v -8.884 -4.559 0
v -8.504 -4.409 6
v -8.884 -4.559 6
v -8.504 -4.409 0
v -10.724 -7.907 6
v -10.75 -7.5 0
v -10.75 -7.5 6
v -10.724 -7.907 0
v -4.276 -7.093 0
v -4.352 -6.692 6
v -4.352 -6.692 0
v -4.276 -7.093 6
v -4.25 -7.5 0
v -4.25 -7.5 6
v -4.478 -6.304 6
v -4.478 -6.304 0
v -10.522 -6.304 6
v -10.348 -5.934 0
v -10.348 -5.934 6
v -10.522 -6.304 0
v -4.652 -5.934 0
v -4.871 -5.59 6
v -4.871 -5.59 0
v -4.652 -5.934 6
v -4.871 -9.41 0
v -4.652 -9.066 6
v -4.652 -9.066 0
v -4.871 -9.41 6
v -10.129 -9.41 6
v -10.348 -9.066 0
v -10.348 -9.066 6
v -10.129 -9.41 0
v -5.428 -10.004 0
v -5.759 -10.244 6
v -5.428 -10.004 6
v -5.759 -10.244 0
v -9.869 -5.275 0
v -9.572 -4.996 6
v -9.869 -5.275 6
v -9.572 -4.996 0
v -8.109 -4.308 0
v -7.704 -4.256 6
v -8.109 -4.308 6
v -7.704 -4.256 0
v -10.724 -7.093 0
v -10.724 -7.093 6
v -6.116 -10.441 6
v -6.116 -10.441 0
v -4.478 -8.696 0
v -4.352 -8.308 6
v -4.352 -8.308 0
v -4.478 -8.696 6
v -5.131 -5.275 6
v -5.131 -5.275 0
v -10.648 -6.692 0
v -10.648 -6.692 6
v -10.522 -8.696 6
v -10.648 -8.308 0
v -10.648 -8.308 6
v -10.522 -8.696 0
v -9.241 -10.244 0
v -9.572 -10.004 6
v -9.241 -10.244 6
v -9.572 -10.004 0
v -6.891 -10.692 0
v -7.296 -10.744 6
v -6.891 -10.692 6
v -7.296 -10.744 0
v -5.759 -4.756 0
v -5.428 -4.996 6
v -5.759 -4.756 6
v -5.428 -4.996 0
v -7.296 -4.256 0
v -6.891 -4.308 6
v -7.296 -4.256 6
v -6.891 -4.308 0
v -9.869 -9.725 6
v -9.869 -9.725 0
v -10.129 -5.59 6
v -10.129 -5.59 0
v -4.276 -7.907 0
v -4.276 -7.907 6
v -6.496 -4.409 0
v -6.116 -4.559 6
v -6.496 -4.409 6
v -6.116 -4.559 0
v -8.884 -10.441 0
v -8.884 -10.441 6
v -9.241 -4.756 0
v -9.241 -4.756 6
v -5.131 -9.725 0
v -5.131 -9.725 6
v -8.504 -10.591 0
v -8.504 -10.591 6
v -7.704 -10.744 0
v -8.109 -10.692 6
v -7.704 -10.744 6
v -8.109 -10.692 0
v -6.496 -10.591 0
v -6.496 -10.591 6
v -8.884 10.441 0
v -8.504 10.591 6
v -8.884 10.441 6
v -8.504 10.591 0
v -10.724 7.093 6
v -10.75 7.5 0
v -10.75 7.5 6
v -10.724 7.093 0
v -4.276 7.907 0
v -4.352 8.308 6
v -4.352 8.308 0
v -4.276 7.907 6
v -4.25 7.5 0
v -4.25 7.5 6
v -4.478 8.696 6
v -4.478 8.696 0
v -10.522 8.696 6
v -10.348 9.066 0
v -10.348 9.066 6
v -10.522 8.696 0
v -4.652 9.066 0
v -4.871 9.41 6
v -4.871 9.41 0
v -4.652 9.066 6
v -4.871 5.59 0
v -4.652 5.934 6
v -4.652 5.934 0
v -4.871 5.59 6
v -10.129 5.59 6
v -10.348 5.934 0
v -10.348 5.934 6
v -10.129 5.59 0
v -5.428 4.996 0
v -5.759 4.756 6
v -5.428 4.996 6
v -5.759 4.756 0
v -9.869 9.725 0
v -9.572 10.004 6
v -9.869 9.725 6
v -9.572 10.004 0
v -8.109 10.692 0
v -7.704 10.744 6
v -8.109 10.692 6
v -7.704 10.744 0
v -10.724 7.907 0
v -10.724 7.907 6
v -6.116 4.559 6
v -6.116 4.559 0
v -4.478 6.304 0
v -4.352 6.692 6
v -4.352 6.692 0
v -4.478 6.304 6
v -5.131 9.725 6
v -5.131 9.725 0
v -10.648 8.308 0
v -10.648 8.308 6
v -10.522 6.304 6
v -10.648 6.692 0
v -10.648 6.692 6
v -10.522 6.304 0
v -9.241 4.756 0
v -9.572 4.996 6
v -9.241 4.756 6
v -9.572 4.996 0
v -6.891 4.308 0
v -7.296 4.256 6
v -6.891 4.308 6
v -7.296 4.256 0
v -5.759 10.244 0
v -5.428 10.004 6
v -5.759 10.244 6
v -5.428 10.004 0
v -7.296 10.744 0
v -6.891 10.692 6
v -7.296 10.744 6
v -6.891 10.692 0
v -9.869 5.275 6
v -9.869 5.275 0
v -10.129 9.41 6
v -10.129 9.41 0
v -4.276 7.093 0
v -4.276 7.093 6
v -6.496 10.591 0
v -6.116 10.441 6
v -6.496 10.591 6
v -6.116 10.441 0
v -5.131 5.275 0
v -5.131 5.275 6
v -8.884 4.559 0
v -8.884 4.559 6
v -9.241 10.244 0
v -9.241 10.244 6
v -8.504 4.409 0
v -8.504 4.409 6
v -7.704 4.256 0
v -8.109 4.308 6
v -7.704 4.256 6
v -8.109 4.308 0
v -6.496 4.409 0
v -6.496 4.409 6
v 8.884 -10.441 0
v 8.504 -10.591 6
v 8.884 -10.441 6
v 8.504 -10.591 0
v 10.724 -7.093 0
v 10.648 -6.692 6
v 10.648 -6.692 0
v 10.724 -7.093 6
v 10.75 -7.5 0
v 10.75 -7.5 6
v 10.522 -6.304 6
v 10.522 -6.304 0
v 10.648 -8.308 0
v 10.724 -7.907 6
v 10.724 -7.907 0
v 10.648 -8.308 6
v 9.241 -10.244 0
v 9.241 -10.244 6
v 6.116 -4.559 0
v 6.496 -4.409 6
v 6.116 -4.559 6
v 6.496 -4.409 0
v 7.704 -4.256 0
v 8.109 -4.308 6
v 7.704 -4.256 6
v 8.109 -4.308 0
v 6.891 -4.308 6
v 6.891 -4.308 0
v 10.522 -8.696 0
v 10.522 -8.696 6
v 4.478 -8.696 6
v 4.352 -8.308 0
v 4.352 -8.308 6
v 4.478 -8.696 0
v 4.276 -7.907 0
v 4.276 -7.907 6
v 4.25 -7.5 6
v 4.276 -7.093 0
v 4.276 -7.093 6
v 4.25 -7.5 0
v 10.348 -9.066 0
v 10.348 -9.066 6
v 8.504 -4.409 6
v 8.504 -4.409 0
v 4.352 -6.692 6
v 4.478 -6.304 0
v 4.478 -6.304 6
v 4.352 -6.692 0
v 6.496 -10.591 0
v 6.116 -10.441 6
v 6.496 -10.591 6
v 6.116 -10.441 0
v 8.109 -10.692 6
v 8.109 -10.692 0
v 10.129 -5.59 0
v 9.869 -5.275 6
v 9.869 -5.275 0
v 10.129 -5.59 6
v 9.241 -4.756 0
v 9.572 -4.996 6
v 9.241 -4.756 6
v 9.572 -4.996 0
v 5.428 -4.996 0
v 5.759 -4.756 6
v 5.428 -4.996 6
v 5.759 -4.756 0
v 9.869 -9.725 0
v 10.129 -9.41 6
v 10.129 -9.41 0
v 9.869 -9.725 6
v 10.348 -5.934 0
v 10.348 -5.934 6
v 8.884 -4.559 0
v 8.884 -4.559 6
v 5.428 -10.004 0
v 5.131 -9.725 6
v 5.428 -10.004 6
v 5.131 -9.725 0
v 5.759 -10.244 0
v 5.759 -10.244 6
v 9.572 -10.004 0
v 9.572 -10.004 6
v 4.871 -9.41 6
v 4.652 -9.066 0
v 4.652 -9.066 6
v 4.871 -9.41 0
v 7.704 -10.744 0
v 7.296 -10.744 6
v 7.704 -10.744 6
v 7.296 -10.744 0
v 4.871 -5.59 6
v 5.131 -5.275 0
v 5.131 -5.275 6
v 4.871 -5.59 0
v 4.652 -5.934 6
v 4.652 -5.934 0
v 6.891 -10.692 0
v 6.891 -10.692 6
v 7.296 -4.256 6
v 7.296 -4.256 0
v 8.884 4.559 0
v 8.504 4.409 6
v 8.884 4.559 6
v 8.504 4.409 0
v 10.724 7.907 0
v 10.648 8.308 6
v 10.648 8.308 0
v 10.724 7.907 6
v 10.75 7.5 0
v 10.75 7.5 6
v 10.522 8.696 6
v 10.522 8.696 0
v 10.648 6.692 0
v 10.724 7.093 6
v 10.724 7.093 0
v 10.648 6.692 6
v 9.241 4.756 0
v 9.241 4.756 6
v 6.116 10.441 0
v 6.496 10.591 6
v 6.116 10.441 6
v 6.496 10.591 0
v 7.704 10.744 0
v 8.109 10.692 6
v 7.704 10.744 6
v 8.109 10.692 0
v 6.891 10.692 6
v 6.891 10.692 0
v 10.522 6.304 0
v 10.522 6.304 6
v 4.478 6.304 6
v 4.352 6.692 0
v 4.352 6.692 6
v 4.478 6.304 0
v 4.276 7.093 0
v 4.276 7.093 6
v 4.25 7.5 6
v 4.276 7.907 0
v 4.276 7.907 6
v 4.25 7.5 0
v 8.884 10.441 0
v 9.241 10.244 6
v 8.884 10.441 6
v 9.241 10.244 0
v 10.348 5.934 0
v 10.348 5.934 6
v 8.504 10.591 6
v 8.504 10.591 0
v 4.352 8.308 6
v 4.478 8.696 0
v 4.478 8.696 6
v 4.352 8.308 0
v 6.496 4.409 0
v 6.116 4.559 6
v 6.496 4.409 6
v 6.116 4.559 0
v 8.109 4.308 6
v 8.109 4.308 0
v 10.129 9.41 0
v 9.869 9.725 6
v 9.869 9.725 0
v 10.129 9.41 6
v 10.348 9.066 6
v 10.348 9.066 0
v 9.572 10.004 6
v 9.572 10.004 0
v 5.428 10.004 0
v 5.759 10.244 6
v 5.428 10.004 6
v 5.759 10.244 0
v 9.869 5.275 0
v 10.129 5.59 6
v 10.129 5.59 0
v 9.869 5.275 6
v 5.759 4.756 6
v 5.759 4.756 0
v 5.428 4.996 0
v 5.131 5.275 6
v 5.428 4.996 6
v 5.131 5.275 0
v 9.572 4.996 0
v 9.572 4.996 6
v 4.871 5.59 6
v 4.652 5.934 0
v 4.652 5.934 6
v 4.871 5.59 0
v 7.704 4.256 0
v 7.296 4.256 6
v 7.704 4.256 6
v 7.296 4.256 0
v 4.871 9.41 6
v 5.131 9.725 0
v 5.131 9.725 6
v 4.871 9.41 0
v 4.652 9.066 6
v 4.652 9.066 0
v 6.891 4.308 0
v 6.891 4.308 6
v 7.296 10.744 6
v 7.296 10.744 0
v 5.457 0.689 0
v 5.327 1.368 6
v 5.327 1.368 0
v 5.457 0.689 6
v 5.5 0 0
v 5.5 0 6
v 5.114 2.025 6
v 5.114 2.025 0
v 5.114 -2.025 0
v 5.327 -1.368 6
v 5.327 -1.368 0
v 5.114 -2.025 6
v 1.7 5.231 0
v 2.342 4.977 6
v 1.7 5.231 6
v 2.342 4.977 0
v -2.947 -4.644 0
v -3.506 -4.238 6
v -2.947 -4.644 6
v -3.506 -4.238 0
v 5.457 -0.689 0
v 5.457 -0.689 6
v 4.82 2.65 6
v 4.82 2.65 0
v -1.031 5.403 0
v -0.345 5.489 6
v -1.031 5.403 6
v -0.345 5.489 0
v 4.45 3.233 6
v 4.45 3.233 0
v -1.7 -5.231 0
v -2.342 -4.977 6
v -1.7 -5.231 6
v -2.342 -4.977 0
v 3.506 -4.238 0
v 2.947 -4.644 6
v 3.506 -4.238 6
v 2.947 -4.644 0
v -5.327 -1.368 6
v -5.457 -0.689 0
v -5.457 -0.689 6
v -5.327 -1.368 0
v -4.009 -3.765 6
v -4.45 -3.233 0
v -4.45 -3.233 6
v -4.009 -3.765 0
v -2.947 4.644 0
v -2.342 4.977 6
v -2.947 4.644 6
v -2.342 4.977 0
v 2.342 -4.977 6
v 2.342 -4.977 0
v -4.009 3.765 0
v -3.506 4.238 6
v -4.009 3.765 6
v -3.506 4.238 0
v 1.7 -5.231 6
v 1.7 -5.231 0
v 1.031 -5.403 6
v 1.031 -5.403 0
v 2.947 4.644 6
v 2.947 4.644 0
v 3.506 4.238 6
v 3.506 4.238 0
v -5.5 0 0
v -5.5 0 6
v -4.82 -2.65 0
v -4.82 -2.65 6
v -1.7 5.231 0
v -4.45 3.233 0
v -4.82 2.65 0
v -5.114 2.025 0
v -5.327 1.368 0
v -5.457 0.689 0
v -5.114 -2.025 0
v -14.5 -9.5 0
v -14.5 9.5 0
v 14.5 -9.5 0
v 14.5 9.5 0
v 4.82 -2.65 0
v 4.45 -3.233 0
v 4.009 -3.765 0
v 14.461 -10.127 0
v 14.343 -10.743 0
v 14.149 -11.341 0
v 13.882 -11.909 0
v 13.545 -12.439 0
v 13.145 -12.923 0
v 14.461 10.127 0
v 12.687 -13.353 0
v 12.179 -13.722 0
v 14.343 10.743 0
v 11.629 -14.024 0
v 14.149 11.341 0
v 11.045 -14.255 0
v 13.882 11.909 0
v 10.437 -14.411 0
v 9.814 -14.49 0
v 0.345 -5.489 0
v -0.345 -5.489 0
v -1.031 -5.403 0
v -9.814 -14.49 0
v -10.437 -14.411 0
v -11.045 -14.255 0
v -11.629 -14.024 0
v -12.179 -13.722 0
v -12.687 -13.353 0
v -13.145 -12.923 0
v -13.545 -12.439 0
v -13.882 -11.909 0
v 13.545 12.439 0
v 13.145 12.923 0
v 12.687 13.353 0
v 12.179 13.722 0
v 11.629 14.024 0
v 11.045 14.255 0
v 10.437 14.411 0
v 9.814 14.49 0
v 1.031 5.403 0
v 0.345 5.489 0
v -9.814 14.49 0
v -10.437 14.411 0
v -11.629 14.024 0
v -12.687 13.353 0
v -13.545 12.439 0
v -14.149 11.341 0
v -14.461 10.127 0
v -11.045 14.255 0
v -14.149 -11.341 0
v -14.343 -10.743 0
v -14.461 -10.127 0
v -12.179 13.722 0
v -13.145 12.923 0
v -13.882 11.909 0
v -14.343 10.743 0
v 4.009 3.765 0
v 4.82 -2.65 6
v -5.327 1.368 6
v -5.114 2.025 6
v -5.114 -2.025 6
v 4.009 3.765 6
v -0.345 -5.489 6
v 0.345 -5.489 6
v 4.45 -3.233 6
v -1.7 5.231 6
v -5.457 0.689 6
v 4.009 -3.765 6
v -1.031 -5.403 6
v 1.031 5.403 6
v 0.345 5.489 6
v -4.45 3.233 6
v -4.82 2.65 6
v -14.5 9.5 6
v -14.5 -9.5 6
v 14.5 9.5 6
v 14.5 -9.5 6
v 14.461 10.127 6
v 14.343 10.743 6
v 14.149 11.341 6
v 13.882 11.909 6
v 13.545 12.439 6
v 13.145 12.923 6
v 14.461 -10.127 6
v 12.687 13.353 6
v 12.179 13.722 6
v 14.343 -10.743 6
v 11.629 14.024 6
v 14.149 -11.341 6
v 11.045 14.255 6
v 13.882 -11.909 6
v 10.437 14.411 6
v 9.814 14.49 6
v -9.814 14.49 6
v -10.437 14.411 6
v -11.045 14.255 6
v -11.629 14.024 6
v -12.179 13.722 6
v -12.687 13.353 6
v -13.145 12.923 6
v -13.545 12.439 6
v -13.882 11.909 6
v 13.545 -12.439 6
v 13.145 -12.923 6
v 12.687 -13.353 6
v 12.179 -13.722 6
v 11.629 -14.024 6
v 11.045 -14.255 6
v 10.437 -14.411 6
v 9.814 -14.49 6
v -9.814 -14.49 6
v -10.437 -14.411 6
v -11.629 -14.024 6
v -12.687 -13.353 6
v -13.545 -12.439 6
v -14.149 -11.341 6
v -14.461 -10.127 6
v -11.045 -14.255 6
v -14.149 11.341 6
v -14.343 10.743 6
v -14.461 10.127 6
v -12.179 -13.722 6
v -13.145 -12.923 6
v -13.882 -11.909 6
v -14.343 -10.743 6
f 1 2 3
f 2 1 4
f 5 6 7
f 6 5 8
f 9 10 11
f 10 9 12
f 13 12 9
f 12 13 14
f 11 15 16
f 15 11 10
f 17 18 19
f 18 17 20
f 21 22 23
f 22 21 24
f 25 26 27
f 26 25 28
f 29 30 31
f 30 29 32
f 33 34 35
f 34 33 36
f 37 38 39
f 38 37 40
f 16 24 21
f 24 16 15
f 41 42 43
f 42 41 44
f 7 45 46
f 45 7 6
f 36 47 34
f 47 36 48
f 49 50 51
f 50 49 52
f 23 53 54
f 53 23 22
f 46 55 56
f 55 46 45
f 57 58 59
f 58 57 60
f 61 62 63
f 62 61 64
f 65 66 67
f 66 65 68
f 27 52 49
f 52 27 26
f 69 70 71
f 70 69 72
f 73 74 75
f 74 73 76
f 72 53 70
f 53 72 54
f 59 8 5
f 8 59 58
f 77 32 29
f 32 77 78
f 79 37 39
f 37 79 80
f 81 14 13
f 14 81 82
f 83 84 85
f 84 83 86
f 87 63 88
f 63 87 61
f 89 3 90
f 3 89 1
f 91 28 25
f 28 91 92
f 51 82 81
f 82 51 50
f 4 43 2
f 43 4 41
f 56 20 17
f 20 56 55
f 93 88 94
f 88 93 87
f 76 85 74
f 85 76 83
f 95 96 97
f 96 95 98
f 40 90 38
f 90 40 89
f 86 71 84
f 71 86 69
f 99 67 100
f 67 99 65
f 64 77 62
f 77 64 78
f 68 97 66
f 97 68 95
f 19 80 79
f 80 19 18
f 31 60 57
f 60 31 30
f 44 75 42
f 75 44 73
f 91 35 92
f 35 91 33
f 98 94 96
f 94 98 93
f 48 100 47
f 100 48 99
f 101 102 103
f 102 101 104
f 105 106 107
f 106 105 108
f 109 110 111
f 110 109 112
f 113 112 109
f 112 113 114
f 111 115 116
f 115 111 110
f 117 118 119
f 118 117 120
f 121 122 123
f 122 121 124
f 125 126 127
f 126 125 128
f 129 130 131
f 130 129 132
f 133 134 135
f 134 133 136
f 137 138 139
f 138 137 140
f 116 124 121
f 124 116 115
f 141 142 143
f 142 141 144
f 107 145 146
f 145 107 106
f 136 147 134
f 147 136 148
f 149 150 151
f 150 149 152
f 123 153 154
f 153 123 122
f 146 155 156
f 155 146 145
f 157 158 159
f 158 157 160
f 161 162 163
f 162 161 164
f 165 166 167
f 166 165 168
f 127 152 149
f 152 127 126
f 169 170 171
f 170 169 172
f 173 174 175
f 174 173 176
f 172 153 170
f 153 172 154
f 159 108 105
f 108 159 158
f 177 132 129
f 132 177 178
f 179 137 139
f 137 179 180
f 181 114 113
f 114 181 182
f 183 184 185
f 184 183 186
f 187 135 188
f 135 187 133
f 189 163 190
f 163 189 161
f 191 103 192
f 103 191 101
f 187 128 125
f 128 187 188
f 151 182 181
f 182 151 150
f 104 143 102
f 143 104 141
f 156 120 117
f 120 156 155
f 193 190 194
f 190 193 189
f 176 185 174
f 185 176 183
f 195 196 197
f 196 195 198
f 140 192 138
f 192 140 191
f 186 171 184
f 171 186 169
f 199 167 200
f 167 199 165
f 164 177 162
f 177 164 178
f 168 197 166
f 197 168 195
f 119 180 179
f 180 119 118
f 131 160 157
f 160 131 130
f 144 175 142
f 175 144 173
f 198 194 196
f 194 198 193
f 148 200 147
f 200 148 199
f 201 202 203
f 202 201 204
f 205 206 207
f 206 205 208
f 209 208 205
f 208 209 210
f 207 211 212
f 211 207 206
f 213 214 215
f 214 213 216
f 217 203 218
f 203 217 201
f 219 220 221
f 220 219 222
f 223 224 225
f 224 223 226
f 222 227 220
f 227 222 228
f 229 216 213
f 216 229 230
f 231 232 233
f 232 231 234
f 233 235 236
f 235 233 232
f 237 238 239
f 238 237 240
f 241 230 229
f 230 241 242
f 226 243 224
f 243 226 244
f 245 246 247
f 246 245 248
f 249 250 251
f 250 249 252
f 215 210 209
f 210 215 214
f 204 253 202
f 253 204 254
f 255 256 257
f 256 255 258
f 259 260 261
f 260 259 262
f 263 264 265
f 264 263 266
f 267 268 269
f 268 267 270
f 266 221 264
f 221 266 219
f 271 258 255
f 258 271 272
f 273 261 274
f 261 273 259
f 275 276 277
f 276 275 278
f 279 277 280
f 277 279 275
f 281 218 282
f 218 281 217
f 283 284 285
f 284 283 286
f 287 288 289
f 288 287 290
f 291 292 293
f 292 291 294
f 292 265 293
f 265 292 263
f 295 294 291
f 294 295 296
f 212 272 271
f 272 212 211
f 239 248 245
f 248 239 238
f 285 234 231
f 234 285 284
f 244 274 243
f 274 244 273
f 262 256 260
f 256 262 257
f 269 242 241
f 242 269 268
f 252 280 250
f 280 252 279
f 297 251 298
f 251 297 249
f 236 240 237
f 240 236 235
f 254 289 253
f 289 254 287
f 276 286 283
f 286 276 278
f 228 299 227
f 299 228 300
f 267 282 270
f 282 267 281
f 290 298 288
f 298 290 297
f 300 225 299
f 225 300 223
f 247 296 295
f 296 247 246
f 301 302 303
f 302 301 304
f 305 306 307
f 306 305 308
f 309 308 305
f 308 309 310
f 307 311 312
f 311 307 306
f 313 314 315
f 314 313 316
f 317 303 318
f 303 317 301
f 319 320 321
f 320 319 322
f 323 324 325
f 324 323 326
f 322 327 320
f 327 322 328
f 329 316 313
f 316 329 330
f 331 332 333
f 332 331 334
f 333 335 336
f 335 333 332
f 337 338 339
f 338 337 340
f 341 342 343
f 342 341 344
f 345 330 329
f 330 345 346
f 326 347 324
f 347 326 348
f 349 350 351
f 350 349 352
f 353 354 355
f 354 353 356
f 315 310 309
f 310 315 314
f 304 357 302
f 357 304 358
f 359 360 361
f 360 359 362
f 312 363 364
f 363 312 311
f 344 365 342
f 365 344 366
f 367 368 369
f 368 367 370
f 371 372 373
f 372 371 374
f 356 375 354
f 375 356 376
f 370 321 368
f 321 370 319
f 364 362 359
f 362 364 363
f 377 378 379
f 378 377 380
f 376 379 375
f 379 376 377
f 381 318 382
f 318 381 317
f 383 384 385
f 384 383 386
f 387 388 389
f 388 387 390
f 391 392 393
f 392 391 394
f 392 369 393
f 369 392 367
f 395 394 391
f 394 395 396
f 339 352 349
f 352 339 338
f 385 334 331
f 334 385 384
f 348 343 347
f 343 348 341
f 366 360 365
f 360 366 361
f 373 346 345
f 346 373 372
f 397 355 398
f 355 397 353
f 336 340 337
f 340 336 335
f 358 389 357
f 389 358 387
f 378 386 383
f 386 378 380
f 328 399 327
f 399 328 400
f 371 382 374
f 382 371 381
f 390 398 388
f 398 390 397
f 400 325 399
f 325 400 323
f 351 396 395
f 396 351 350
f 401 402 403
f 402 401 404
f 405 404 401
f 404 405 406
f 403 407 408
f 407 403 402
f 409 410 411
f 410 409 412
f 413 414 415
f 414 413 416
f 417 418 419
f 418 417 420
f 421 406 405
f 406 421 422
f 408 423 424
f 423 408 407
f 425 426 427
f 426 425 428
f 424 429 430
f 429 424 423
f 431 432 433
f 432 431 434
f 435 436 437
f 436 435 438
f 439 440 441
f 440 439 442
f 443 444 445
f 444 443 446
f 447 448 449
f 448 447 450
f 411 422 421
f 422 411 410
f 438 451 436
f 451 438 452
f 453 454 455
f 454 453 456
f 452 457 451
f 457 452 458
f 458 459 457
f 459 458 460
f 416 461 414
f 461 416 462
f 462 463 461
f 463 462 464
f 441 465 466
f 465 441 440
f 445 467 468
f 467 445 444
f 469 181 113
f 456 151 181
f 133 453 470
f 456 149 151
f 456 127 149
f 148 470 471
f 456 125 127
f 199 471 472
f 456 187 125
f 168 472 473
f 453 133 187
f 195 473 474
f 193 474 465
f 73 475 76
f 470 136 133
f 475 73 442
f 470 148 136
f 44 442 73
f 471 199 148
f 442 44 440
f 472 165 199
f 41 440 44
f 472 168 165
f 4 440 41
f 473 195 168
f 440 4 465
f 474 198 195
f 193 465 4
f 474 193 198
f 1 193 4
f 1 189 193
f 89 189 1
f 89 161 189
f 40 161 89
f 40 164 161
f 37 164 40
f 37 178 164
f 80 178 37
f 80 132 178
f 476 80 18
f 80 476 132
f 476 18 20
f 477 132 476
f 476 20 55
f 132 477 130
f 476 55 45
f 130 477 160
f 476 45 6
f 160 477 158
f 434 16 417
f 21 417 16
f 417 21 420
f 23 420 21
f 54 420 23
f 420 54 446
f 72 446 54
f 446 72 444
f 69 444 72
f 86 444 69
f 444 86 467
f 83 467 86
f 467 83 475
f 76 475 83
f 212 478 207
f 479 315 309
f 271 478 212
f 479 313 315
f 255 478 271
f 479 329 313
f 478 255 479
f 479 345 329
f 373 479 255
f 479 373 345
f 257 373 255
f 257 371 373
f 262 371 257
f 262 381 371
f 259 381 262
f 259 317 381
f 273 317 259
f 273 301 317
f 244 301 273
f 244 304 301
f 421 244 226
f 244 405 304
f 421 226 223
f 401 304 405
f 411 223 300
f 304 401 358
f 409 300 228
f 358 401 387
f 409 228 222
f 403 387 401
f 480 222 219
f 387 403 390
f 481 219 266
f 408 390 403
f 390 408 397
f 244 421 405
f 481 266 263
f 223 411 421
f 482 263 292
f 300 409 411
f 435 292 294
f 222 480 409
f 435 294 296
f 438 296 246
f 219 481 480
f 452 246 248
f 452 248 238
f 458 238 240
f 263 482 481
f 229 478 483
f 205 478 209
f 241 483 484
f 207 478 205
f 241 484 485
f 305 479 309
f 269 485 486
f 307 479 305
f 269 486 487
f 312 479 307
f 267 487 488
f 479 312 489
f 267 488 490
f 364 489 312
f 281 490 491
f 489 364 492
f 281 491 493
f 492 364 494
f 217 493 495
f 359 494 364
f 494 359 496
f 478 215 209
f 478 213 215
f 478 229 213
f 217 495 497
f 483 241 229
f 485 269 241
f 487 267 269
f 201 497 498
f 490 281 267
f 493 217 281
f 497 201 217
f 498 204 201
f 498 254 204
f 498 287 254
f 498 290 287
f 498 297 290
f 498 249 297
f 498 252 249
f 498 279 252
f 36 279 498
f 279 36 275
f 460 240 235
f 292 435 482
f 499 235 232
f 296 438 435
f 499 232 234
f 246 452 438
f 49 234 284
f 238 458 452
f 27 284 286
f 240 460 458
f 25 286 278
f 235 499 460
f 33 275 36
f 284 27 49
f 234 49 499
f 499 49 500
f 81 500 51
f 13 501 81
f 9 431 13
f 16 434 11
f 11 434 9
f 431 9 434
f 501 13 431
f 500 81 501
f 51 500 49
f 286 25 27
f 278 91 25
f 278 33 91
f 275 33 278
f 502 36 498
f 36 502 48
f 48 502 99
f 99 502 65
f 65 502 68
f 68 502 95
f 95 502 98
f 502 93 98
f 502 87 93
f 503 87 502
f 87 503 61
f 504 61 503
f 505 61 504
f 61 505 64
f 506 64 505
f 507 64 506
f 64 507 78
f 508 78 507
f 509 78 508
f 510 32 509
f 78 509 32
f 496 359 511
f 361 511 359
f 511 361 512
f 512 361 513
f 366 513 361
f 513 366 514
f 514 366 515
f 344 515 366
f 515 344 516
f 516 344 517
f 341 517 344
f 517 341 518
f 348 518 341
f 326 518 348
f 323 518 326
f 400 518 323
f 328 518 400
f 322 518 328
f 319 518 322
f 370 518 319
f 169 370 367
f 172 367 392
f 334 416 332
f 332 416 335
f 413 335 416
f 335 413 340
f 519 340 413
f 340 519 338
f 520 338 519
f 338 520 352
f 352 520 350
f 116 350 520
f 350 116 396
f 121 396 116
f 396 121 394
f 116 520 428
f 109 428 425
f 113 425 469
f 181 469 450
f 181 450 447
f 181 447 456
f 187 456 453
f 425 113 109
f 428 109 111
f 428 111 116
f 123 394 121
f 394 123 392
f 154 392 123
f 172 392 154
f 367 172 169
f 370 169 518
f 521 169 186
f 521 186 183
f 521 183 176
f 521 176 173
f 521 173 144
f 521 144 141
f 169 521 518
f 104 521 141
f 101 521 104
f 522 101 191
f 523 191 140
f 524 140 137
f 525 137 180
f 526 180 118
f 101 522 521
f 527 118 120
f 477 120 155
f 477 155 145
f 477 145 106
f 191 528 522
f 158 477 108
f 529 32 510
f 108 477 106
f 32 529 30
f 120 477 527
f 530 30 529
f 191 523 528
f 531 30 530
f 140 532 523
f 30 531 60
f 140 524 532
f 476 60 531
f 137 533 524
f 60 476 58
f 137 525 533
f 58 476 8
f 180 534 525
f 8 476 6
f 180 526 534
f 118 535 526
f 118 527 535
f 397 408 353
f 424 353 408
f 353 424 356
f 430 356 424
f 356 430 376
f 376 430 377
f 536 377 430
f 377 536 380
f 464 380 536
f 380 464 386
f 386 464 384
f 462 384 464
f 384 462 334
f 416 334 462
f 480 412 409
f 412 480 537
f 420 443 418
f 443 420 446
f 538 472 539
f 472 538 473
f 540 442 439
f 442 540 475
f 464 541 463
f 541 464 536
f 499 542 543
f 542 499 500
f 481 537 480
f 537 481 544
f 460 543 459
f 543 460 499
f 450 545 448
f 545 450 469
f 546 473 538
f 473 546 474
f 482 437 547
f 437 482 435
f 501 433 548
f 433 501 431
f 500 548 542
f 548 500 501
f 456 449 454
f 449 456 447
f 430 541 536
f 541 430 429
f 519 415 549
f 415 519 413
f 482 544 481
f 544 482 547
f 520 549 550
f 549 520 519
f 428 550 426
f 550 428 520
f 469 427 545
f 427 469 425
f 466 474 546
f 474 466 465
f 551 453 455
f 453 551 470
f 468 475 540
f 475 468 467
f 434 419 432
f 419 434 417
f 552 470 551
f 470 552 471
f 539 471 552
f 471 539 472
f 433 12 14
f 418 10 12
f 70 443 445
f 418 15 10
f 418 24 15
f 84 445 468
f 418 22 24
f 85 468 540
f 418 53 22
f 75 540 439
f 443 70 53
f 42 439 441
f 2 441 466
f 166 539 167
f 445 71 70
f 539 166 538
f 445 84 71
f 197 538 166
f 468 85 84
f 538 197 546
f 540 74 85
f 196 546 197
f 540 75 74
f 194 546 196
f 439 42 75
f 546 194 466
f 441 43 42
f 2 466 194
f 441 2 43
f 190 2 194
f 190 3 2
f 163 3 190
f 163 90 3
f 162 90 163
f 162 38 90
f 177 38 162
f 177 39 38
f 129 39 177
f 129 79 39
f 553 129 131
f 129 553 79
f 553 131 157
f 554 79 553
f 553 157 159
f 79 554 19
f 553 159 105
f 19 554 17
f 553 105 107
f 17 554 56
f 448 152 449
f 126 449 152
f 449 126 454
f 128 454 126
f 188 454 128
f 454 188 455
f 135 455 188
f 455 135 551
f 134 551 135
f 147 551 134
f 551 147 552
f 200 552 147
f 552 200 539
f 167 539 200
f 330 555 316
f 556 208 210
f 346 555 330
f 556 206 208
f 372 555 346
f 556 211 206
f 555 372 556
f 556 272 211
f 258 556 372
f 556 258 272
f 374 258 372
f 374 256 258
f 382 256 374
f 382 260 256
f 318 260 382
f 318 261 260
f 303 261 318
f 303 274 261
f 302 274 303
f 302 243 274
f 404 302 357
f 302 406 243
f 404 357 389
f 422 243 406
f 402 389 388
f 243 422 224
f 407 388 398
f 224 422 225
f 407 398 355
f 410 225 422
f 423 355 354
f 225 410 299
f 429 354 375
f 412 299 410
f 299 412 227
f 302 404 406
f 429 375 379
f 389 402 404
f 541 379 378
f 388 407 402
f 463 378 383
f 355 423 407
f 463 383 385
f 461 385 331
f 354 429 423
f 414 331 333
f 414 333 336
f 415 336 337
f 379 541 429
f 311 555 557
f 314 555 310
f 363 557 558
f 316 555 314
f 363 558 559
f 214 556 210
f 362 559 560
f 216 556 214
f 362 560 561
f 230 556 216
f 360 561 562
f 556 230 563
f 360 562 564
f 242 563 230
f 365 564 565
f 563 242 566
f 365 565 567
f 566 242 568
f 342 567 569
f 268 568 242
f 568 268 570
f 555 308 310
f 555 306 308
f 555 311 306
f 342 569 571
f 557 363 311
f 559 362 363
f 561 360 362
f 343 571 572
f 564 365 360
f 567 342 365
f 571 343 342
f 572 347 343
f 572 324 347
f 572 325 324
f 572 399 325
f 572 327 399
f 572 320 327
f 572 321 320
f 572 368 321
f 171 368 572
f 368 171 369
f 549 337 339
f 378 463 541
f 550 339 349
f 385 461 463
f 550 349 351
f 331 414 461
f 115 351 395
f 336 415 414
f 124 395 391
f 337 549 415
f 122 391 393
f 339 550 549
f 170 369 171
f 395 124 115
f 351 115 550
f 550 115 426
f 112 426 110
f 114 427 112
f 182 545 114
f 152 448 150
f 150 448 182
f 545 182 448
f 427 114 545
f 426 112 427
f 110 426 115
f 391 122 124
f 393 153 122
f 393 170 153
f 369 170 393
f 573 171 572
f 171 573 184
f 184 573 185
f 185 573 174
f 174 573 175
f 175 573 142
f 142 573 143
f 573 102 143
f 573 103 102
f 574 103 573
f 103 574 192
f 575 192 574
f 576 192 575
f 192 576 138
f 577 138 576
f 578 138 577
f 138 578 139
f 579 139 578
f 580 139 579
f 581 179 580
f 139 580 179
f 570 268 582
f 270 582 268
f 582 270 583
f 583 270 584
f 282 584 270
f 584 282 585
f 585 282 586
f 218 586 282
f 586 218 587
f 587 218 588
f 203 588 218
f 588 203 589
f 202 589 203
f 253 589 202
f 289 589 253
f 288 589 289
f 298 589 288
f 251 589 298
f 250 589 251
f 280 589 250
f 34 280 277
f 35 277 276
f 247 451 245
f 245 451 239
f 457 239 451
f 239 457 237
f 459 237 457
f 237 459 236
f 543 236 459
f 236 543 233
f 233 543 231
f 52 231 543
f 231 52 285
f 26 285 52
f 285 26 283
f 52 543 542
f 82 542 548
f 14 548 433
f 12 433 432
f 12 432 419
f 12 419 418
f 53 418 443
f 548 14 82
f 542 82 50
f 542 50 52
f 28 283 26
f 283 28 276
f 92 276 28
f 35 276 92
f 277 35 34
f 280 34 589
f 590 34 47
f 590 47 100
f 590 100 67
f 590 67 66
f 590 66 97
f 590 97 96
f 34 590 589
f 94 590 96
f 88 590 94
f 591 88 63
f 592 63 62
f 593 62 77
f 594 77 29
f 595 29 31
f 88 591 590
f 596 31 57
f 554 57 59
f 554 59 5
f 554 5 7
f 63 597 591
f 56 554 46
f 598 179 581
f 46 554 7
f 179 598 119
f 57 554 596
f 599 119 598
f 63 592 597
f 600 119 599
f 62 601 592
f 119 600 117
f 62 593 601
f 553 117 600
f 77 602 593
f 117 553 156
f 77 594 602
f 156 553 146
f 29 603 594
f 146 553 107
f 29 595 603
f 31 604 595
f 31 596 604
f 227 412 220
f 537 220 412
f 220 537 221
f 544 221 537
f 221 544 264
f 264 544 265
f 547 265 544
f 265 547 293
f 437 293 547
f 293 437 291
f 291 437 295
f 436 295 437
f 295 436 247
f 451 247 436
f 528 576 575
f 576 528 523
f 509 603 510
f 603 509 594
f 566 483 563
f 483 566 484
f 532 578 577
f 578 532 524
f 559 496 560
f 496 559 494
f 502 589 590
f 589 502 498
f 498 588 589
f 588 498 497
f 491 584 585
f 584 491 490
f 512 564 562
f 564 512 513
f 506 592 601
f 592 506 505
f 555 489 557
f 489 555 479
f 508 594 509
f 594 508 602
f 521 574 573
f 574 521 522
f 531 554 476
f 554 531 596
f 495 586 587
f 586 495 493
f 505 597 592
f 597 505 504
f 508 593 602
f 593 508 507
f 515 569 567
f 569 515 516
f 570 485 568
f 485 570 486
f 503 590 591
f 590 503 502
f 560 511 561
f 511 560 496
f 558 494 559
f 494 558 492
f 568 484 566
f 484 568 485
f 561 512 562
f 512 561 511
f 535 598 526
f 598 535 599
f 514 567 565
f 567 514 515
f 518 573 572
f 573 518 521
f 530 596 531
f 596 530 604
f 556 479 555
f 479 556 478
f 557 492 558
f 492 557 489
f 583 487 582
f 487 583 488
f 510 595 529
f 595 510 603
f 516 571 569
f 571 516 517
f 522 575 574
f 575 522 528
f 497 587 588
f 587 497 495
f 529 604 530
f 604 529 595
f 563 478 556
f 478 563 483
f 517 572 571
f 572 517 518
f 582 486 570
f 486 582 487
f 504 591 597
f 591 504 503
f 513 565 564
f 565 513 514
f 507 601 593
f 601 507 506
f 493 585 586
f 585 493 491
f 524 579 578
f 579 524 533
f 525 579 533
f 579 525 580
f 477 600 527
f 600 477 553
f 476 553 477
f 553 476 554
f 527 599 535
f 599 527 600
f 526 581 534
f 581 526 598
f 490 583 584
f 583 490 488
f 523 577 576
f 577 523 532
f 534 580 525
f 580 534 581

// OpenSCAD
$fn = 50;

difference() {
	union() {
		hull() {
			translate(v = [-9.5, 9.5, 0]) {
				cylinder(h = 6, r = 5);
			}
			translate(v = [9.5, 9.5, 0]) {
				cylinder(h = 6, r = 5);
			}
			translate(v = [-9.5, -9.5, 0]) {
				cylinder(h = 6, r = 5);
			}
			translate(v = [9.5, -9.5, 0]) {
				cylinder(h = 6, r = 5);
			}
		}
	}
	union() {
		translate(v = [-7.5, -7.5, -100.0]) {
			cylinder(h = 200, r = 3.25);
		}
		translate(v = [-7.5, 7.5, -100.0]) {
			cylinder(h = 200, r = 3.25);
		}
		translate(v = [7.5, -7.5, -100.0]) {
			cylinder(h = 200, r = 3.25);
		}
		translate(v = [7.5, 7.5, -100.0]) {
			cylinder(h = 200, r = 3.25);
		}
		translate(v = [-7.5, -7.5, -100.0]) {
			cylinder(h = 200, r = 1.8);
		}
		translate(v = [-7.5, 7.5, -100.0]) {
			cylinder(h = 200, r = 1.8);
		}
		translate(v = [7.5, -7.5, -100.0]) {
			cylinder(h = 200, r = 1.8);
		}
		translate(v = [7.5, 7.5, -100.0]) {
			cylinder(h = 200, r = 1.8);
		}
		cylinder(h = 6, r = 5.5);
	}
}
